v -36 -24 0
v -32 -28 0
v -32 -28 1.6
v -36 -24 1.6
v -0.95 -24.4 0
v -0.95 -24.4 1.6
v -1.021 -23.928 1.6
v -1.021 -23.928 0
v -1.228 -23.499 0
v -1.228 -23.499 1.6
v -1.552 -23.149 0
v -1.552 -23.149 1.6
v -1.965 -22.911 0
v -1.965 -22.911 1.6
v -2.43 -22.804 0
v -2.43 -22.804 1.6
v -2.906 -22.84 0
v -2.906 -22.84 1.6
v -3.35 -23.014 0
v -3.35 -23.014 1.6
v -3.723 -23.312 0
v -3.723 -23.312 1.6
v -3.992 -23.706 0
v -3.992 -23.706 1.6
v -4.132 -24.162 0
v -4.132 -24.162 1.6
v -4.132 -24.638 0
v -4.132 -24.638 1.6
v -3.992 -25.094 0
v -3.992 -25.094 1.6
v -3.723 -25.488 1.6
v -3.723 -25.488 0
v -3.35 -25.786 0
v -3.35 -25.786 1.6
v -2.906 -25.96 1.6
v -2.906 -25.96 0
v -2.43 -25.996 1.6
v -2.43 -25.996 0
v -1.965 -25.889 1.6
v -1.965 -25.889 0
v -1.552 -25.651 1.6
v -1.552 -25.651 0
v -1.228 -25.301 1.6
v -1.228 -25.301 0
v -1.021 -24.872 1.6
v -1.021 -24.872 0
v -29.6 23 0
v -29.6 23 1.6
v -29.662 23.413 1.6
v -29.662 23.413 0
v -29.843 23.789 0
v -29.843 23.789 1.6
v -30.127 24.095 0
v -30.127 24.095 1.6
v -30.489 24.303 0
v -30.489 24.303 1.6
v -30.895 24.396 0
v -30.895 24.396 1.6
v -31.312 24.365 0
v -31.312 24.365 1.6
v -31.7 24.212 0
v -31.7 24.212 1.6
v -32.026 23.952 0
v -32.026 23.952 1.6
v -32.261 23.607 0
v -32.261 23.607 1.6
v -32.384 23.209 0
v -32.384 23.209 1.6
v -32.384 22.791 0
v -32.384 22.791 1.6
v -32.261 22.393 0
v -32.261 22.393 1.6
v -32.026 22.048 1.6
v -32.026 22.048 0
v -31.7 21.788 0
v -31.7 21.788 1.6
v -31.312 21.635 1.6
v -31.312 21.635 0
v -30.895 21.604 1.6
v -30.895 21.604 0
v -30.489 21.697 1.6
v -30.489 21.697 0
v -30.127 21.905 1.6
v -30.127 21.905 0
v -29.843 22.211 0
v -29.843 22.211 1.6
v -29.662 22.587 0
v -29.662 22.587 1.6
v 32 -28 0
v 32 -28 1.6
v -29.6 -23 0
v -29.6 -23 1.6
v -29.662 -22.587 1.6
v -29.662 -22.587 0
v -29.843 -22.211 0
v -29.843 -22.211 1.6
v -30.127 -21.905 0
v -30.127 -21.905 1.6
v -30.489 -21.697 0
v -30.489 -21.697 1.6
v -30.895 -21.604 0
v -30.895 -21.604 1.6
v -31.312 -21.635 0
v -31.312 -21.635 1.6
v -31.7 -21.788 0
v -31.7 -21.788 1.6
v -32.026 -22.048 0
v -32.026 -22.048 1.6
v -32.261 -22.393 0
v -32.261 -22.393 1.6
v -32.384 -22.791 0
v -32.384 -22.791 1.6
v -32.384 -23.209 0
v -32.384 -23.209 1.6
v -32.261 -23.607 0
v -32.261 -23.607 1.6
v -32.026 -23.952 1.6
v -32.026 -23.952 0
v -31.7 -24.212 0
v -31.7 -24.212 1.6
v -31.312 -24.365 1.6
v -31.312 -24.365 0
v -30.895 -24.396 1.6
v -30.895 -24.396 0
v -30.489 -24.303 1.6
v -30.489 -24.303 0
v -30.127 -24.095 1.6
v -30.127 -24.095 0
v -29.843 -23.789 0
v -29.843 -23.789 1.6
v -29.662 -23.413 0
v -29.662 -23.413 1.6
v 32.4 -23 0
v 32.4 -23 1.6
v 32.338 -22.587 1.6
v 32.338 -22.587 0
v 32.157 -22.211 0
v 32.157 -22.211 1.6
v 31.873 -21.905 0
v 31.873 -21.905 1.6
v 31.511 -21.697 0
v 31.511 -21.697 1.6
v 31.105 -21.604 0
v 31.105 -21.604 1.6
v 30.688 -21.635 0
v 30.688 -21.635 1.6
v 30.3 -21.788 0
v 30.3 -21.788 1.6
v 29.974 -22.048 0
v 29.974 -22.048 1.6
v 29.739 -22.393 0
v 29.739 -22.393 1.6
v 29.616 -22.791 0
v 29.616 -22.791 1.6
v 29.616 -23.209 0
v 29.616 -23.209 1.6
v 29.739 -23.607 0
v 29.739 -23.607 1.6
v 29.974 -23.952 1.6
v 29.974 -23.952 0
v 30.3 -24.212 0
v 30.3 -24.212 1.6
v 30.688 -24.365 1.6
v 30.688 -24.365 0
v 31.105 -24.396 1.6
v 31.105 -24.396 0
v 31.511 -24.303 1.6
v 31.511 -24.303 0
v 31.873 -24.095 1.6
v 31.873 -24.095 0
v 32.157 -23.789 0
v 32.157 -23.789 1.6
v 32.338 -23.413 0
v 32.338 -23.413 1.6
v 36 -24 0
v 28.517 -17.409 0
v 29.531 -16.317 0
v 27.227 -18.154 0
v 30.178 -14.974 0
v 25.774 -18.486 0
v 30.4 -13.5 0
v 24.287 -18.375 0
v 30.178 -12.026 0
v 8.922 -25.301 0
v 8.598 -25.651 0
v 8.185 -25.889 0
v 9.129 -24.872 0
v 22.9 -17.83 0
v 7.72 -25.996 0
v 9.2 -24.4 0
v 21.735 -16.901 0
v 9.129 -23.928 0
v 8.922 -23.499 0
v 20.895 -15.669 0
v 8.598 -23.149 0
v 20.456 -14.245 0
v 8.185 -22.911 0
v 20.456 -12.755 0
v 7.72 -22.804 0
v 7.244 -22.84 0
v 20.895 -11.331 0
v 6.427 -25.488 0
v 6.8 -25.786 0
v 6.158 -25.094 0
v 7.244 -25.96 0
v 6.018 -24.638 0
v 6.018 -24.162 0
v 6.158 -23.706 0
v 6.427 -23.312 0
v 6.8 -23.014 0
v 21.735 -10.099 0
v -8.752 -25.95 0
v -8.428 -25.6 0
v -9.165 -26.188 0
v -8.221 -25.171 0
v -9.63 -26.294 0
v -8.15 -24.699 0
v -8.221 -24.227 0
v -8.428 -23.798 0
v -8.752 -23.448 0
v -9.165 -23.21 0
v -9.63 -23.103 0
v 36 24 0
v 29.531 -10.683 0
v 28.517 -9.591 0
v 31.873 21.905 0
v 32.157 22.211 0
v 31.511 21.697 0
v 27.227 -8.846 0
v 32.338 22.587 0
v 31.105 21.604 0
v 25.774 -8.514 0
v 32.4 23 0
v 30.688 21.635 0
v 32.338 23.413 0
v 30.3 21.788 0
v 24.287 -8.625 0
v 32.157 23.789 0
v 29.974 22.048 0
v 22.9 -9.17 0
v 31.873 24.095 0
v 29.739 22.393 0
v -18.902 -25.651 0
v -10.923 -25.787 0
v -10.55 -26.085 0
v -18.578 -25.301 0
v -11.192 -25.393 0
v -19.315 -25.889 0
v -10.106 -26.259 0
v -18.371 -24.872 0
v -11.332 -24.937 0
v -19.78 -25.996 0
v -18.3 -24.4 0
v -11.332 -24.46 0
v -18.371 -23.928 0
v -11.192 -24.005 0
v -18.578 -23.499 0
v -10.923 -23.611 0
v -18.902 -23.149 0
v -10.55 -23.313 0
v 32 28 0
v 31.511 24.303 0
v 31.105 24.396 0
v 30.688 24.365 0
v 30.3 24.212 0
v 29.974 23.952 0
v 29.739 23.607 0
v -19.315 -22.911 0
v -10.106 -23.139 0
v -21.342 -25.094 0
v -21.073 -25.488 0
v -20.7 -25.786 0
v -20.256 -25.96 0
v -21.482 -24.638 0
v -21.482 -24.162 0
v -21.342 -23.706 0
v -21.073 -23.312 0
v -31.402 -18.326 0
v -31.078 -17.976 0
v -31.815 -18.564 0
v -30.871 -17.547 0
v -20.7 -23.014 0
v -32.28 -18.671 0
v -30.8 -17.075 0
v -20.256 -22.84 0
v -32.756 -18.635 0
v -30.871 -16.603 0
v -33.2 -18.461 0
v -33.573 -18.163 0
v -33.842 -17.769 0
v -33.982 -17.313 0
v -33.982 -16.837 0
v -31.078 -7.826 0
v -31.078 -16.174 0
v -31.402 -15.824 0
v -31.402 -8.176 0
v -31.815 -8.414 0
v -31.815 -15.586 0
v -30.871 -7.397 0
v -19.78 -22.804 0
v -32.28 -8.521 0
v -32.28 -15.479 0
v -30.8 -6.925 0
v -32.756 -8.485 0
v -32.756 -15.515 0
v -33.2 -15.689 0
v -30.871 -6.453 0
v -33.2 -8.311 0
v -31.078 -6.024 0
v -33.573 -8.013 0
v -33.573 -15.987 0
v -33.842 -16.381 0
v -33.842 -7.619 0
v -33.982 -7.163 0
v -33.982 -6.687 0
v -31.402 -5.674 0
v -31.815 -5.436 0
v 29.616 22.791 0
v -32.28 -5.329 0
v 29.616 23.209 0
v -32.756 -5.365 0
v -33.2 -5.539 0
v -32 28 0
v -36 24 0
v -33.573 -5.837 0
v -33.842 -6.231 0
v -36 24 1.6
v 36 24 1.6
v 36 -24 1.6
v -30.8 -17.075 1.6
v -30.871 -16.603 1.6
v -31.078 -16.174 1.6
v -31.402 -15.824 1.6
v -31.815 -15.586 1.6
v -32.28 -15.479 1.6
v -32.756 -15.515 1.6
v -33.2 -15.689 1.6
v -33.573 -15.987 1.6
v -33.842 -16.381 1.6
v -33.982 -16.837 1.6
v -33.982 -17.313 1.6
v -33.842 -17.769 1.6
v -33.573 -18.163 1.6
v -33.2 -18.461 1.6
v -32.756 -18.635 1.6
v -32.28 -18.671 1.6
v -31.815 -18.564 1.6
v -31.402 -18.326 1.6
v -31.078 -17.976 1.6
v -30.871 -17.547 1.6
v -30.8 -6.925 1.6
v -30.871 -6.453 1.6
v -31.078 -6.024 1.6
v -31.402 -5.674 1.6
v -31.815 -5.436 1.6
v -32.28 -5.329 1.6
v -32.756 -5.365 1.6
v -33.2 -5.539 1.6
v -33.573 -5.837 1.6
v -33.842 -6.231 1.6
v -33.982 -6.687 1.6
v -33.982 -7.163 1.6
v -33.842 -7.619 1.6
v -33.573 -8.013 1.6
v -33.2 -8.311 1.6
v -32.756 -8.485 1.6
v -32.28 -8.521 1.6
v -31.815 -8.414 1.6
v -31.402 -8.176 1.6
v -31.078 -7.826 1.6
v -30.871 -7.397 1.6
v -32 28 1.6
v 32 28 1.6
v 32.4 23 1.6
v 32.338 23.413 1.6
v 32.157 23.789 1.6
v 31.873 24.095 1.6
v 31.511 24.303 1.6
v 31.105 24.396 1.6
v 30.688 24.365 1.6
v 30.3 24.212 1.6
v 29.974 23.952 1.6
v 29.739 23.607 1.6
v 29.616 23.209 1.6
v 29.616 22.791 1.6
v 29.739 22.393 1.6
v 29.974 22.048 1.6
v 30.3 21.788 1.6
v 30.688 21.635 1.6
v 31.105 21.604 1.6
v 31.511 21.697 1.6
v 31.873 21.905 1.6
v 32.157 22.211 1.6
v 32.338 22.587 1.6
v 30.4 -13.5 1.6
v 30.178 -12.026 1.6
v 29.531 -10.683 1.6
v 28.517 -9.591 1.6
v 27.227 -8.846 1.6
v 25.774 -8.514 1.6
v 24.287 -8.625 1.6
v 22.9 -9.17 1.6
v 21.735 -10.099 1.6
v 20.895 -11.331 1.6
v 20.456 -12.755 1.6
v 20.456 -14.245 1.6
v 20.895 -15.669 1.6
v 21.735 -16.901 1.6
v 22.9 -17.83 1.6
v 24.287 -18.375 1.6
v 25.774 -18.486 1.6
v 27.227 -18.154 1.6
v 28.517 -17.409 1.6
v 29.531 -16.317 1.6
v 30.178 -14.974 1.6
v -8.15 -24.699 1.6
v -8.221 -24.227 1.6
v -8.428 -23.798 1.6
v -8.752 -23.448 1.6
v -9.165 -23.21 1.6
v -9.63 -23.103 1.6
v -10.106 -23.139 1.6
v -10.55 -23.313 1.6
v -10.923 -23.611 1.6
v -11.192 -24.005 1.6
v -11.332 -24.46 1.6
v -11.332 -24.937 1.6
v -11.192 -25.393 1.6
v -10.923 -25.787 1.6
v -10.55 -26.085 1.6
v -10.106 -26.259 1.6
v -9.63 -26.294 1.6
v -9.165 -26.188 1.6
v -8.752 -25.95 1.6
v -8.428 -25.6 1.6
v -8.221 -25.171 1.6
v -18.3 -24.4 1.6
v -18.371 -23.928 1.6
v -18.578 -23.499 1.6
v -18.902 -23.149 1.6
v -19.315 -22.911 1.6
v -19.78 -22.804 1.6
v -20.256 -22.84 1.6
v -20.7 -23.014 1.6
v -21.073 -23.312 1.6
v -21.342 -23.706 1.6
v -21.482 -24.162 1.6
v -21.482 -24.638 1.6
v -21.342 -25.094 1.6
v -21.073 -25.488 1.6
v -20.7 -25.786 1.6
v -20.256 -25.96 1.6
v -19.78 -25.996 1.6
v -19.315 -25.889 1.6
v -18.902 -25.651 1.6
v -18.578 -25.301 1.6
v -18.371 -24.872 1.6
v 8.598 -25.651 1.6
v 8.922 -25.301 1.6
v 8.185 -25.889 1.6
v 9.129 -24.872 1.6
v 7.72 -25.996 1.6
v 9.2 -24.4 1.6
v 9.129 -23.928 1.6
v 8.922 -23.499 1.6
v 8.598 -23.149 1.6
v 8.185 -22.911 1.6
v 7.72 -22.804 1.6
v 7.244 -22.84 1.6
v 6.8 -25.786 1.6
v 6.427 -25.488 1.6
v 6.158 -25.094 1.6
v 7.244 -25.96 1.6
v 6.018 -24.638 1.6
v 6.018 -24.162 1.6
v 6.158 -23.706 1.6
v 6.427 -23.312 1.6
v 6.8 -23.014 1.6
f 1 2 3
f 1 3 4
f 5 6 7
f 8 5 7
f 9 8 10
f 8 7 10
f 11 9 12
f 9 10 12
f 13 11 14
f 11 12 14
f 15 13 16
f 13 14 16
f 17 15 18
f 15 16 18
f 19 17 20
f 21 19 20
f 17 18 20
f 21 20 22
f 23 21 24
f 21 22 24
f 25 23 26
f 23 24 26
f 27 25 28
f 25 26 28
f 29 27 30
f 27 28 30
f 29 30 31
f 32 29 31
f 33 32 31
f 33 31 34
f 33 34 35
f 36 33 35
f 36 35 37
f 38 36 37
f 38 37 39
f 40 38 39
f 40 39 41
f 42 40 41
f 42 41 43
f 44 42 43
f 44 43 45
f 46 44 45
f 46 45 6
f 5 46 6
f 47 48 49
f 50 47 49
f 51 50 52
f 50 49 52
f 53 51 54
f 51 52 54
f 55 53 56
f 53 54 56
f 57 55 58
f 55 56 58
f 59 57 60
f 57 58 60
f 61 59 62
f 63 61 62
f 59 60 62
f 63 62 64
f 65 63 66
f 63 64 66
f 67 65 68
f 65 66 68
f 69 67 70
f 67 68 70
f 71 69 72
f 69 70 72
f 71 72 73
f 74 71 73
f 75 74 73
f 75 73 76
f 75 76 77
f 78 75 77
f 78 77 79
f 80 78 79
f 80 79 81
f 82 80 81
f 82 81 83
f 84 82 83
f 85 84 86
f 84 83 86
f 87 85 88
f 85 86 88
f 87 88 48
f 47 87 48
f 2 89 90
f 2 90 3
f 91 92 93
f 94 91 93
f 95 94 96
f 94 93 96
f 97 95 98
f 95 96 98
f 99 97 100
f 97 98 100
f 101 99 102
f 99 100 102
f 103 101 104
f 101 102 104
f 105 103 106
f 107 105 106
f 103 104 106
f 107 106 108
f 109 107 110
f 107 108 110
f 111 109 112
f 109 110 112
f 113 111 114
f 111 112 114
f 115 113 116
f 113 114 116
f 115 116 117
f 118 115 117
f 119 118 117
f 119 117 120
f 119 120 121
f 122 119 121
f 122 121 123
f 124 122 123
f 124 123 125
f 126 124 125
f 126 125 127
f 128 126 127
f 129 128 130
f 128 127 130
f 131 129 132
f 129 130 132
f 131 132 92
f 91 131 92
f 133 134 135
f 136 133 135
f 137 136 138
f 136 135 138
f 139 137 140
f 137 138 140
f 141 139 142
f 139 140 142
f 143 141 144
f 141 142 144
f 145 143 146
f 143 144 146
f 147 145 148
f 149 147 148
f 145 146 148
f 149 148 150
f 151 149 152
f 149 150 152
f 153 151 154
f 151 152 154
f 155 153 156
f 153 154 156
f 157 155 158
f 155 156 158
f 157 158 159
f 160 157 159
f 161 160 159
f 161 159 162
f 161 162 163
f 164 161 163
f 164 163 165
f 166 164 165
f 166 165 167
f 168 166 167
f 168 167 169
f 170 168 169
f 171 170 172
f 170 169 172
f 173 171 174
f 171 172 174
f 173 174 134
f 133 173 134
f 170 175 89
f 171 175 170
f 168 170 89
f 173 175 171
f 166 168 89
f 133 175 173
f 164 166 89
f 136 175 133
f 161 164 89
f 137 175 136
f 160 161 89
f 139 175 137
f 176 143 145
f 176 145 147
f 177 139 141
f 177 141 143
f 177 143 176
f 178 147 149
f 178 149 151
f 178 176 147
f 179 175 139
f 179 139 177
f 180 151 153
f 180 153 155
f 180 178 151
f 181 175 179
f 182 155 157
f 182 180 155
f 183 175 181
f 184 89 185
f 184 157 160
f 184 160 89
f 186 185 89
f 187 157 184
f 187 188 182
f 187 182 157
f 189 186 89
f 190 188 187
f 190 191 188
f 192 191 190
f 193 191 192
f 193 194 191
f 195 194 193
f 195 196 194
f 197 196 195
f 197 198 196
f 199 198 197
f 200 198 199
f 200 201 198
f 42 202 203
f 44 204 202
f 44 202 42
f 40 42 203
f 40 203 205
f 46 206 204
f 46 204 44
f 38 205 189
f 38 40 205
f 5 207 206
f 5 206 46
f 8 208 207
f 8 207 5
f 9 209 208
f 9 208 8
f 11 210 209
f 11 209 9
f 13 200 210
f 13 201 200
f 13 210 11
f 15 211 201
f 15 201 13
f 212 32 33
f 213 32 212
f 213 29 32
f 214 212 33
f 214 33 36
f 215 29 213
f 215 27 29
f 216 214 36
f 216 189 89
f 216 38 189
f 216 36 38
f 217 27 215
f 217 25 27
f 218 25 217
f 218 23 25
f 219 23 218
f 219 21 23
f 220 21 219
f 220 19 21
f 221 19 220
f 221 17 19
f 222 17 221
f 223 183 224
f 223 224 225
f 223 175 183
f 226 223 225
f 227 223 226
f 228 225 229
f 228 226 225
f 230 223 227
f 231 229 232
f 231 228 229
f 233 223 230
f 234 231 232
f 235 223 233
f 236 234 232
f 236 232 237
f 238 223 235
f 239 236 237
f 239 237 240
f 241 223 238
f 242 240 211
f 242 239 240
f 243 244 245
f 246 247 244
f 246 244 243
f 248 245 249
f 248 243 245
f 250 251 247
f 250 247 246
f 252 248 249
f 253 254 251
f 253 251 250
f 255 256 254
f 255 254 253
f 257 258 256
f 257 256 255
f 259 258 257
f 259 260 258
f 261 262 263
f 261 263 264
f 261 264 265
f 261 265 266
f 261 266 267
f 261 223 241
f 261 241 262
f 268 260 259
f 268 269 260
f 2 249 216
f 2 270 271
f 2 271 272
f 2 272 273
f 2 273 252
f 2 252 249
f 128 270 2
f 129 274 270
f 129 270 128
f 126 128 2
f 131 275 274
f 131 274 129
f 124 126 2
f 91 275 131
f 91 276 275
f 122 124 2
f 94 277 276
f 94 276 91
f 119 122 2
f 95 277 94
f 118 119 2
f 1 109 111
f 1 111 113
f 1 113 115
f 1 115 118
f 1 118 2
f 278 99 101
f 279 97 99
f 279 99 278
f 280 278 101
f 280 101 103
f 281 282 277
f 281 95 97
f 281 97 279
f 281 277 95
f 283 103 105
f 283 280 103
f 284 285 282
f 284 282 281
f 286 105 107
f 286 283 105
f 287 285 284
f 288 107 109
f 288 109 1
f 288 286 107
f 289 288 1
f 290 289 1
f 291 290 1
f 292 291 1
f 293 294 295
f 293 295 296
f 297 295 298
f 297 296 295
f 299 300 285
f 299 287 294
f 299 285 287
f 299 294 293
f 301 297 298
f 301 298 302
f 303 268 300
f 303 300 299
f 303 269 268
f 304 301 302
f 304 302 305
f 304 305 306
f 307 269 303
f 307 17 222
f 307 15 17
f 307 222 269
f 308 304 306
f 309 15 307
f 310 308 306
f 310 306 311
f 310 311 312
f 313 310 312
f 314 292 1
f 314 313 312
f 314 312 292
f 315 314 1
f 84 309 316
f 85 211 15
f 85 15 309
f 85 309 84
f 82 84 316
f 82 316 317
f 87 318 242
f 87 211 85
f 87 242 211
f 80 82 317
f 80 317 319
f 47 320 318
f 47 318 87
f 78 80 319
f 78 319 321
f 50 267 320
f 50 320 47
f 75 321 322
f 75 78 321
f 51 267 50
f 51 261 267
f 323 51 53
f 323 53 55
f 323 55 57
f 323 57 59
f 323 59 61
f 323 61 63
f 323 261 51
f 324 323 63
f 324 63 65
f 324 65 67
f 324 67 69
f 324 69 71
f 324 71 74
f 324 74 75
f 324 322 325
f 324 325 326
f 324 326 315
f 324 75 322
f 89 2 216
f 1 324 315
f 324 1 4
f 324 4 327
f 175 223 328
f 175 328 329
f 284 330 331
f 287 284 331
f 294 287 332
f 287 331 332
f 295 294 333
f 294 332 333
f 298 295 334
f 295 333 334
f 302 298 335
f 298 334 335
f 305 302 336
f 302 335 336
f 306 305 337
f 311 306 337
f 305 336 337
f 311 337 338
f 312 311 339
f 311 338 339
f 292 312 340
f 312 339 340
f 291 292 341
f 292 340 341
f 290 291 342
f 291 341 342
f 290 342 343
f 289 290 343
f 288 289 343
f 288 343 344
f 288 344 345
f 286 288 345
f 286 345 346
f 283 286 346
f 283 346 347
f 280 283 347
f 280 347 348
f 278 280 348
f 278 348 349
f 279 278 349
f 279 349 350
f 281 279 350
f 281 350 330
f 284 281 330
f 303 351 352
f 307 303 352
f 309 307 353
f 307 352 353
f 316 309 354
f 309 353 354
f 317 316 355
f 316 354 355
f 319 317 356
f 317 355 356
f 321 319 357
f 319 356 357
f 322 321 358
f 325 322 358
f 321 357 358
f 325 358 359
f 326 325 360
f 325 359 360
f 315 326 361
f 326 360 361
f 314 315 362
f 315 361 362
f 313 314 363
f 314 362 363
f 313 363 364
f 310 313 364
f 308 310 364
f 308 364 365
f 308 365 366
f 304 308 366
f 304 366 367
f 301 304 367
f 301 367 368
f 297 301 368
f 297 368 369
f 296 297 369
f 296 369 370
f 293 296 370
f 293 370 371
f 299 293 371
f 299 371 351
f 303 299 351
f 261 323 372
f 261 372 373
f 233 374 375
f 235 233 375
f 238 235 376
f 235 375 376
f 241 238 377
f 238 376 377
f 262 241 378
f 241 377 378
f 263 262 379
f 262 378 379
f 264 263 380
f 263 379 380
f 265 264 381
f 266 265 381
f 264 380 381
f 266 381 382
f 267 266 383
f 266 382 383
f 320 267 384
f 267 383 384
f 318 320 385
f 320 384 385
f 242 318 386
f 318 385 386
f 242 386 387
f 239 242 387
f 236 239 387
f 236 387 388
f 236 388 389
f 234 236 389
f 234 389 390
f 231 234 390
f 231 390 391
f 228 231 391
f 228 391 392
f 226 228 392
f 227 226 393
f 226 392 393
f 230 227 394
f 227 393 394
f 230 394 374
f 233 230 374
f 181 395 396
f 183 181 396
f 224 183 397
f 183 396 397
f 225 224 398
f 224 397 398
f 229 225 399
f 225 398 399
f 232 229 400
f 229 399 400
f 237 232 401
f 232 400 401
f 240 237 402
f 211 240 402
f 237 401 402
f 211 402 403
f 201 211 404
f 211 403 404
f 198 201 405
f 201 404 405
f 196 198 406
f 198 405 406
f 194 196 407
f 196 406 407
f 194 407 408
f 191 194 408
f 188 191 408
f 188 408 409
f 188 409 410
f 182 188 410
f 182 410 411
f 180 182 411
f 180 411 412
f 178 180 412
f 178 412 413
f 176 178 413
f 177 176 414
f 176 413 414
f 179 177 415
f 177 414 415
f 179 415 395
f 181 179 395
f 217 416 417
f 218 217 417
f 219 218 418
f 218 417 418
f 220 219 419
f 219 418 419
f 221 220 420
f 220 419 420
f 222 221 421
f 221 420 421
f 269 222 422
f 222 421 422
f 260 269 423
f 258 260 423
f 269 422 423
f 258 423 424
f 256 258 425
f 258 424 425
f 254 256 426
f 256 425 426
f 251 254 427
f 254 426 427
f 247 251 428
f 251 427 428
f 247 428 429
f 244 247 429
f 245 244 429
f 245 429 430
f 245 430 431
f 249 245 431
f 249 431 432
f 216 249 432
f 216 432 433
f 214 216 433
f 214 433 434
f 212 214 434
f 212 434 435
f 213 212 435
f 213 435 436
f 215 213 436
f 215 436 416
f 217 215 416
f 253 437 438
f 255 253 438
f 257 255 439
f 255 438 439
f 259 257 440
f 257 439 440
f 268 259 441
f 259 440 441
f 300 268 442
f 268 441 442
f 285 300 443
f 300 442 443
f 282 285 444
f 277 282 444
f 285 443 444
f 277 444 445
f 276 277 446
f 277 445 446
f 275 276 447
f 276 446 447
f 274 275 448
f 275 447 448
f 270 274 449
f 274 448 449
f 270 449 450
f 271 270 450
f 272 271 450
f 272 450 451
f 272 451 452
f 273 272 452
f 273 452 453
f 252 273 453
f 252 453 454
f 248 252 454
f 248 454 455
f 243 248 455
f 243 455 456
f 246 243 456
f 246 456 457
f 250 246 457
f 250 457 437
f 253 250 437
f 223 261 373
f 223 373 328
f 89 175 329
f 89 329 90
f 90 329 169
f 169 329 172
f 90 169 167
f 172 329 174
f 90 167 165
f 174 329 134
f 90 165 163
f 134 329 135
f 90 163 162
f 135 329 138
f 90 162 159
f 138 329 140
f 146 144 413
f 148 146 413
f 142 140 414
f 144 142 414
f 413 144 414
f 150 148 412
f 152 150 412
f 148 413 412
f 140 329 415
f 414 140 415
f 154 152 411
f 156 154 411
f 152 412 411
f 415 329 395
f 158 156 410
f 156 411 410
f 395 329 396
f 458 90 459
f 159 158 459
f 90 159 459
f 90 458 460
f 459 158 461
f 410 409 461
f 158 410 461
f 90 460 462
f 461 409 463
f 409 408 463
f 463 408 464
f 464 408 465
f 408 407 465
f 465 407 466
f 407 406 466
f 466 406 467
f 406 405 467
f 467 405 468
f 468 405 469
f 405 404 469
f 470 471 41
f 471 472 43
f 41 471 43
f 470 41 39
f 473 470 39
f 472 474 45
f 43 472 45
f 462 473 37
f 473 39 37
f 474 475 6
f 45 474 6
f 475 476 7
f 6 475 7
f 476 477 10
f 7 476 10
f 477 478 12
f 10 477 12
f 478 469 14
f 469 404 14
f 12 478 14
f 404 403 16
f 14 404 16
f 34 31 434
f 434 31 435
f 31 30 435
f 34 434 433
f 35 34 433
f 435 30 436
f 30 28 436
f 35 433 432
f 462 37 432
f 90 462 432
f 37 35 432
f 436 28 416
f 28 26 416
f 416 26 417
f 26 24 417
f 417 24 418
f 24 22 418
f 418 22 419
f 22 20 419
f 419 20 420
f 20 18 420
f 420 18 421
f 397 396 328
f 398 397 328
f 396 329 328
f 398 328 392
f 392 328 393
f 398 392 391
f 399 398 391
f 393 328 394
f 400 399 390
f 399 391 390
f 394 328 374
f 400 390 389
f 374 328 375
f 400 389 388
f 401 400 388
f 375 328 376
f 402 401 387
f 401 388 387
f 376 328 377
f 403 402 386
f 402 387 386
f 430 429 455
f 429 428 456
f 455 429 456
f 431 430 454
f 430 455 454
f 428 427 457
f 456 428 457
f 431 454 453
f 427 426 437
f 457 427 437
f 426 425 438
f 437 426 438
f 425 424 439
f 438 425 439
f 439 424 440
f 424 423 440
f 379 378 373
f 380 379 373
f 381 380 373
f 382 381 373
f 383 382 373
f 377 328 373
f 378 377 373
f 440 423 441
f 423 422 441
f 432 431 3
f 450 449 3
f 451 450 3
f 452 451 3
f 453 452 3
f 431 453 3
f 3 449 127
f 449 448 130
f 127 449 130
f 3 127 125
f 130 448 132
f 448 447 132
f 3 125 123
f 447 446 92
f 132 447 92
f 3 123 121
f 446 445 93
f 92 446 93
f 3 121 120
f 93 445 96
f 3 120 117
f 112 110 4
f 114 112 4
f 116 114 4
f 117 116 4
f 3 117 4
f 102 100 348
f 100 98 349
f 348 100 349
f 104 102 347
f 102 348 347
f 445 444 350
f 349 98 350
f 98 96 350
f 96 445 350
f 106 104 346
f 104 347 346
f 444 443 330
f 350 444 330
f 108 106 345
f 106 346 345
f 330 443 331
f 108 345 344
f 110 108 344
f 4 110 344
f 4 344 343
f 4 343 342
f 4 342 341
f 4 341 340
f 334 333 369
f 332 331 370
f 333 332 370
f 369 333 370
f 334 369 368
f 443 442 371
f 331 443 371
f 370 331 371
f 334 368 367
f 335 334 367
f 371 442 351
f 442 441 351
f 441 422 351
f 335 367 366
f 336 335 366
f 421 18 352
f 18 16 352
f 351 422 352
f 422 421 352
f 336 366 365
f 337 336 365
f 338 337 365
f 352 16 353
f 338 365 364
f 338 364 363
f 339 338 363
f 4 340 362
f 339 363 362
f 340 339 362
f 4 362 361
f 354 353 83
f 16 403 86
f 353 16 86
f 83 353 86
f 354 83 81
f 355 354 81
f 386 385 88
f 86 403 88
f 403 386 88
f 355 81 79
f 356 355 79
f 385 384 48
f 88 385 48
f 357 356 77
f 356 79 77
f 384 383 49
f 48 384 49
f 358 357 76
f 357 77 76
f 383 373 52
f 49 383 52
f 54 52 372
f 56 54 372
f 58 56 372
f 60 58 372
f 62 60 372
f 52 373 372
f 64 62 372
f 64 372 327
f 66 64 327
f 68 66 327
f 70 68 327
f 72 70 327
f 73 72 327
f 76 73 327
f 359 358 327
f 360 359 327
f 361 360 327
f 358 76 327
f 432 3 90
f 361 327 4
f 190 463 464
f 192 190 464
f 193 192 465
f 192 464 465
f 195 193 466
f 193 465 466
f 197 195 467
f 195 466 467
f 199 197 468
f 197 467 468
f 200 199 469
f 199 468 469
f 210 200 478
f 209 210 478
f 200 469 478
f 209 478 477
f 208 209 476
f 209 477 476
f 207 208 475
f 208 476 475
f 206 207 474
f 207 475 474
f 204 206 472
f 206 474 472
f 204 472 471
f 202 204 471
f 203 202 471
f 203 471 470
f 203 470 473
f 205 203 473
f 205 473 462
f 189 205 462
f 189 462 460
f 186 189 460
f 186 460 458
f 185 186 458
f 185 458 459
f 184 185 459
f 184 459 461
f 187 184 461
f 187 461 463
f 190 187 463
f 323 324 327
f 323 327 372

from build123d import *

# Parameters (mm, degrees)
BOSS_EXTRUDE1_DEPTH = 1.6
SKETCH2_R           = 1.4
CUT_EXTRUDE1_DEPTH  = 1.6
SKETCH3_R           = 5
CUT_EXTRUDE2_DEPTH  = 1.6
SKETCH4_R           = 1.6
CUT_EXTRUDE3_DEPTH  = 10


with BuildPart() as part:
    # Sketch1 → Boss-Extrude1 (new body)
    with BuildSketch(Plane.XY):
        Polygon((32, 28), (36, 24), (36, -24), (32, -28), (-32, -28), (-36, -24), (-36, 24), (-32, 28), align=None)
    extrude(amount=BOSS_EXTRUDE1_DEPTH)

    # Sketch2 → Cut-Extrude1 (cut)
    with BuildSketch(Plane.XY.offset(1.6)):
        with Locations((-31, 23)):
            Circle(SKETCH2_R)
        with Locations((31, 23)):
            Circle(SKETCH2_R)
        with Locations((-31, -23)):
            Circle(SKETCH2_R)
        with Locations((31, -23)):
            Circle(SKETCH2_R)
    extrude(amount=-CUT_EXTRUDE1_DEPTH, mode=Mode.SUBTRACT)

    # Sketch3 → Cut-Extrude2 (cut)
    with BuildSketch(Plane.XY.offset(1.6)):
        with Locations((25.4, -13.5)):
            Circle(SKETCH3_R)
    extrude(amount=-CUT_EXTRUDE2_DEPTH, mode=Mode.SUBTRACT)

    # Sketch4 → Cut-Extrude3 (cut)
    with BuildSketch(Plane.XY.offset(1.6)):
        with Locations((-19.9, -24.4)):
            Circle(SKETCH4_R)
        with Locations((-9.75, -24.698906537)):
            Circle(SKETCH4_R)
        with Locations((-2.55, -24.4)):
            Circle(SKETCH4_R)
        with Locations((7.6, -24.4)):
            Circle(SKETCH4_R)
        with Locations((-32.4, -17.075)):
            Circle(SKETCH4_R)
        with Locations((-32.4, -6.925)):
            Circle(SKETCH4_R)
    extrude(amount=-CUT_EXTRUDE3_DEPTH, mode=Mode.SUBTRACT)


solid = part.part
